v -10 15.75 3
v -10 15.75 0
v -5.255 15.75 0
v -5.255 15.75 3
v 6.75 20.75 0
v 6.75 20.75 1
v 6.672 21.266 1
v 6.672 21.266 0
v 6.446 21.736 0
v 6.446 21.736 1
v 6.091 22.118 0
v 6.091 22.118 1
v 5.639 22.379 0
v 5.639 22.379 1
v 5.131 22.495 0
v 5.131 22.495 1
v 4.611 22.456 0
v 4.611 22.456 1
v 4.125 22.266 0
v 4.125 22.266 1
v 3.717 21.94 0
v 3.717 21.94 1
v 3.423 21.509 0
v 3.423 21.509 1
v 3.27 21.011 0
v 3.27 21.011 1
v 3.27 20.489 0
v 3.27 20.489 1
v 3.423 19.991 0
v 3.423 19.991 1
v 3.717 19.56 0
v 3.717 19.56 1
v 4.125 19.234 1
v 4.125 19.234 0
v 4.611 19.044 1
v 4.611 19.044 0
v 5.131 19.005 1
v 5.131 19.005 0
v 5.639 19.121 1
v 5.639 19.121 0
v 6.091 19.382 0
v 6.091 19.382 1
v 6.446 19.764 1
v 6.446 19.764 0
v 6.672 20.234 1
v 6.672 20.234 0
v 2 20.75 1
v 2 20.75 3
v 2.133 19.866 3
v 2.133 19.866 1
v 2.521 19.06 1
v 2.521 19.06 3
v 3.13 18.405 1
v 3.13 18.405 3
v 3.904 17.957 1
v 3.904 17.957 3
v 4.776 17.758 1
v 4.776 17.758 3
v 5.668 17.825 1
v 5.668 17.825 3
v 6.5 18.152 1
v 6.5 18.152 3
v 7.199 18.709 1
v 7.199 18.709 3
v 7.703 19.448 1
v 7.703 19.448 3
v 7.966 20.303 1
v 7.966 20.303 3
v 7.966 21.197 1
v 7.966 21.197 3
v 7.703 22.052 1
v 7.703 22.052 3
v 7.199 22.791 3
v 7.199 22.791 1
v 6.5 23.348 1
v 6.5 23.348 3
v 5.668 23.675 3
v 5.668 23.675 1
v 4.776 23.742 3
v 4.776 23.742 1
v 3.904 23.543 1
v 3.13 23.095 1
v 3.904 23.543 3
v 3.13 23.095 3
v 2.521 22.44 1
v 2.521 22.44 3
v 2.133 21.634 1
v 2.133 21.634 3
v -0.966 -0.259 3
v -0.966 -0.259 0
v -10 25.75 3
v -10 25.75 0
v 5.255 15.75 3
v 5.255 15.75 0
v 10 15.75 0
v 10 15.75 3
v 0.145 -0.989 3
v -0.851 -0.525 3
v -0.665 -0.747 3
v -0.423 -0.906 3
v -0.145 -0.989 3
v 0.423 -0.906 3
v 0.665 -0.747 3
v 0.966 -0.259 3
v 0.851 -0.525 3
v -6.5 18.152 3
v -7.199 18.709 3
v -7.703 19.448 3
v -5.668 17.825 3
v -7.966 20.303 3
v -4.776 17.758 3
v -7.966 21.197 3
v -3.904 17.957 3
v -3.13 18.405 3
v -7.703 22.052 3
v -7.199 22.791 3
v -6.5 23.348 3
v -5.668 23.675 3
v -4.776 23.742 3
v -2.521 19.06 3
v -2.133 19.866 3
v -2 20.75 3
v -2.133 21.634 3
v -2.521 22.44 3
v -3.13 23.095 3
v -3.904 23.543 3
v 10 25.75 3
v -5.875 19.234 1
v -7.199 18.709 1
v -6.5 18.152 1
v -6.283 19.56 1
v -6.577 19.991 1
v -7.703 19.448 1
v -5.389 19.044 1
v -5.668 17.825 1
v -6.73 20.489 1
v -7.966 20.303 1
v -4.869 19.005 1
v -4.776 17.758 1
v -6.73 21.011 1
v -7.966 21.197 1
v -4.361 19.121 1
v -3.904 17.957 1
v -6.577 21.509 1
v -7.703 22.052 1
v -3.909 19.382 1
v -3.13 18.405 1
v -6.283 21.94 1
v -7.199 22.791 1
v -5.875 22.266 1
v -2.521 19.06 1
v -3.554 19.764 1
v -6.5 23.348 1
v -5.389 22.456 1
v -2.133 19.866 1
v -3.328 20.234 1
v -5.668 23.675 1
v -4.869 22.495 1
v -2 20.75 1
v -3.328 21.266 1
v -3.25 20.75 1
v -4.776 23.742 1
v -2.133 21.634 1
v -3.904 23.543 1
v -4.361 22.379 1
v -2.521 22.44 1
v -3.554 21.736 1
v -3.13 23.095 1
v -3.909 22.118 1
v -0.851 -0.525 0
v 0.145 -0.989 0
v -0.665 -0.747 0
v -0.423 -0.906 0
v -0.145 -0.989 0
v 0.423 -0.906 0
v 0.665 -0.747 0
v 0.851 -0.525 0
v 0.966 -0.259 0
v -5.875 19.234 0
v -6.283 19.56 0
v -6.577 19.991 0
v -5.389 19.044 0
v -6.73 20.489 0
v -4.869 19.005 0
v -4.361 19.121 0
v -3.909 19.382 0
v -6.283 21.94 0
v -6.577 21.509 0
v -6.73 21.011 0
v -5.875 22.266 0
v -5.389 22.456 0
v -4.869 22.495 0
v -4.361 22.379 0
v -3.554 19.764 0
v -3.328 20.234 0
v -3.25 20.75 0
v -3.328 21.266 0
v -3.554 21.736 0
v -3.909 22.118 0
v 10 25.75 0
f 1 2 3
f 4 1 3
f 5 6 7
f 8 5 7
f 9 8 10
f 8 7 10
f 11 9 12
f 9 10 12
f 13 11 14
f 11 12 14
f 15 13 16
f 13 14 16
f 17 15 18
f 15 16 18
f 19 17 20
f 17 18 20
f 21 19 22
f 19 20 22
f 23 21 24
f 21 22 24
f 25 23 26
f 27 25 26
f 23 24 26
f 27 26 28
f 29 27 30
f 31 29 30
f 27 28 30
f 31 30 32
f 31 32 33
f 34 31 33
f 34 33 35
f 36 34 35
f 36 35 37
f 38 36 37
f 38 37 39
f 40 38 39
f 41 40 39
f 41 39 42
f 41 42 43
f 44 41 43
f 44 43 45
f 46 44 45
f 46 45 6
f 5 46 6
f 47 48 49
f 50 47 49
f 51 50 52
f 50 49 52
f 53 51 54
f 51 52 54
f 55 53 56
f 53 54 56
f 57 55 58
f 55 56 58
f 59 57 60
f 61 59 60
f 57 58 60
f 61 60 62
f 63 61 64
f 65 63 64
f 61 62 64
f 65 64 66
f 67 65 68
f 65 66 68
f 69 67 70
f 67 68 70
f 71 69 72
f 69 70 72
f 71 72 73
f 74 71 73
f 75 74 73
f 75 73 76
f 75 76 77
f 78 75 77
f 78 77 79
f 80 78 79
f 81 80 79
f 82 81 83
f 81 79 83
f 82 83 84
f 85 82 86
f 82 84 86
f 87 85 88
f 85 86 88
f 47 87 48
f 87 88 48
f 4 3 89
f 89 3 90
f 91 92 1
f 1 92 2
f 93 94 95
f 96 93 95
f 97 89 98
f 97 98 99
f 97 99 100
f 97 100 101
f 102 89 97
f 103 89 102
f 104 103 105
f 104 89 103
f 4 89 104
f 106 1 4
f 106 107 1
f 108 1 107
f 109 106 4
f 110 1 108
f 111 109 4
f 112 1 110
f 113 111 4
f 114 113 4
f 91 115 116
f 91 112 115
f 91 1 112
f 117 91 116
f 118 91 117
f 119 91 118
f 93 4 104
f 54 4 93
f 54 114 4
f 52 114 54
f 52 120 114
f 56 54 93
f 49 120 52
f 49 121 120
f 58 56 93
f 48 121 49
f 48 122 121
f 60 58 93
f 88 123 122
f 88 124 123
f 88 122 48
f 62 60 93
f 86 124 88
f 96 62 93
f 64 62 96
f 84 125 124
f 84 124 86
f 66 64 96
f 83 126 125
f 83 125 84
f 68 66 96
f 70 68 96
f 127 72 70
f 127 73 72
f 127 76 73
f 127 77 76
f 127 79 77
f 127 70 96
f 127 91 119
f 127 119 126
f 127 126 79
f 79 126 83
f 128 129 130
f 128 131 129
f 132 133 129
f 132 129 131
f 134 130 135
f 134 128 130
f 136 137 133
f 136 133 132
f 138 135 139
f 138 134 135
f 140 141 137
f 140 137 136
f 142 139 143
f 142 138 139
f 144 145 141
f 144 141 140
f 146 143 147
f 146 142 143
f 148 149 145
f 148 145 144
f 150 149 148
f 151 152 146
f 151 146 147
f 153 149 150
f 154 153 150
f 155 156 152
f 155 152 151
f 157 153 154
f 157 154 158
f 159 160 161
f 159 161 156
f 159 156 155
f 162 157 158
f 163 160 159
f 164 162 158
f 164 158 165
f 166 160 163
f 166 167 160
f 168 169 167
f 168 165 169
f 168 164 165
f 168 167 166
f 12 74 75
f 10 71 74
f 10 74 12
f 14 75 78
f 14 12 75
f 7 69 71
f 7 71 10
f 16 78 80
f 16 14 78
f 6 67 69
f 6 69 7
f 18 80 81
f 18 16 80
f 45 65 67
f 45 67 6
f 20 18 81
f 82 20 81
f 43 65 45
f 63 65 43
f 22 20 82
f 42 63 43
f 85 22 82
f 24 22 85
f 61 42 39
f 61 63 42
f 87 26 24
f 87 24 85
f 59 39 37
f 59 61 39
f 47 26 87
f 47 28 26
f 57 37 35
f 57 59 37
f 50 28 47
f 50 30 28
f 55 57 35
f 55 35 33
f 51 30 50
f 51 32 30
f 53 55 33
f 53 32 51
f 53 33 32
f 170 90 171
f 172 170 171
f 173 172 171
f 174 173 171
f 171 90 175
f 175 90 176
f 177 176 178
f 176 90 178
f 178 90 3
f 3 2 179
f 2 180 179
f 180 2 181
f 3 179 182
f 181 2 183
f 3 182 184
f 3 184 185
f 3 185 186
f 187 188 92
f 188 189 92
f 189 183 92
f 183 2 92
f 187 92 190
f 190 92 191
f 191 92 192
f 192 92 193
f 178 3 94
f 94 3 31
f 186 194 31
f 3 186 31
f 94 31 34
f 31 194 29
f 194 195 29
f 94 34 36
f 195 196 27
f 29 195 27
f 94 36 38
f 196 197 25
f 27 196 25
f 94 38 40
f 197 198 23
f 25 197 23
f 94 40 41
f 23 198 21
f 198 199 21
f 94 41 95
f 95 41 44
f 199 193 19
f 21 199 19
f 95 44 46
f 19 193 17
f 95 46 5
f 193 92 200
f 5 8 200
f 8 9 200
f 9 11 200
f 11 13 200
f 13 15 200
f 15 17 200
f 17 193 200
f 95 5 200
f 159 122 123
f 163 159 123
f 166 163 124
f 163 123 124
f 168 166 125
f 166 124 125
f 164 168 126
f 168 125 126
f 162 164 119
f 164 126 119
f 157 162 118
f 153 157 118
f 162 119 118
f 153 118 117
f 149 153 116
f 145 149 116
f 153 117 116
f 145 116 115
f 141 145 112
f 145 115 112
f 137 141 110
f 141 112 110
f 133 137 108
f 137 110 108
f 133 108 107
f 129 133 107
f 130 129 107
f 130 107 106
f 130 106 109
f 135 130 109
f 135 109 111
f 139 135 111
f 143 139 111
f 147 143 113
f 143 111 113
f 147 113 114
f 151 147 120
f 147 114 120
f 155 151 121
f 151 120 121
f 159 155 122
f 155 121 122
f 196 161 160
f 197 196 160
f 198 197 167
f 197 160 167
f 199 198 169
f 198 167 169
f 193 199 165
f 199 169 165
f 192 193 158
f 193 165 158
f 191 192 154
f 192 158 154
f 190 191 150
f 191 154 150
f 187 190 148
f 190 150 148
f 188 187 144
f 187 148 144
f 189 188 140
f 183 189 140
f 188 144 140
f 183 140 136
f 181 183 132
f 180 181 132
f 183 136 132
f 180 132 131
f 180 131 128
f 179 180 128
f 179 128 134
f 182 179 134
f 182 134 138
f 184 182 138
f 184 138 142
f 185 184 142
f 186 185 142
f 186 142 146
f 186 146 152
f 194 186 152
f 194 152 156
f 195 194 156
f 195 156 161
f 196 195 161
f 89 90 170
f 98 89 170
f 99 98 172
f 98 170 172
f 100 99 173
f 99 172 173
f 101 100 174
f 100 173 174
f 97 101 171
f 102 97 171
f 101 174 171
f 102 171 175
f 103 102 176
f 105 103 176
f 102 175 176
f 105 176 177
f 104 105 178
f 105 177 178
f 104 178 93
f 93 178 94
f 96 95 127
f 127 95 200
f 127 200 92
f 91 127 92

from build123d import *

# Parameters (mm, degrees)
BOSS_EXTRUDE1_DEPTH = 3
SKETCH3_R           = 1.75
CUT_EXTRUDE1_DEPTH  = 3
SKETCH5_R           = 3
CUT_EXTRUDE2_DEPTH  = 2


with BuildPart() as part:
    # Sketch2 → Boss-Extrude1 (new body)
    with BuildSketch(Plane.XY):
        with BuildLine():
            Line((-5.255475961, 15.75), (-0.965925826, -0.258819045))
            ThreePointArc((-0.965925826, -0.258819045), (0, -1), (0.965925826, -0.258819045))
            Line((0.965925826, -0.258819045), (5.255475961, 15.75))
            Line((5.255475961, 15.75), (10, 15.75))
            Line((10, 15.75), (10, 25.75))
            Line((10, 25.75), (-10, 25.75))
            Line((-10, 25.75), (-10, 15.75))
            Line((-10, 15.75), (-5.255475961, 15.75))
        make_face()
    extrude(amount=BOSS_EXTRUDE1_DEPTH)

    # Sketch3 → Cut-Extrude1 (cut)
    with BuildSketch(Plane.XY.offset(3)):
        with Locations((-5, 20.75)):
            Circle(SKETCH3_R)
        with Locations((5, 20.75)):
            Circle(SKETCH3_R)
    extrude(amount=-CUT_EXTRUDE1_DEPTH, mode=Mode.SUBTRACT)

    # Sketch5 → Cut-Extrude2 (cut)
    with BuildSketch(Plane.XY.offset(3)):
        with Locations((-5, 20.75)):
            Circle(SKETCH5_R)
        with Locations(Location((5, 20.75, 0), (0, 0, 180))):
            Circle(SKETCH5_R)
    extrude(amount=-CUT_EXTRUDE2_DEPTH, mode=Mode.SUBTRACT)


solid = part.part
